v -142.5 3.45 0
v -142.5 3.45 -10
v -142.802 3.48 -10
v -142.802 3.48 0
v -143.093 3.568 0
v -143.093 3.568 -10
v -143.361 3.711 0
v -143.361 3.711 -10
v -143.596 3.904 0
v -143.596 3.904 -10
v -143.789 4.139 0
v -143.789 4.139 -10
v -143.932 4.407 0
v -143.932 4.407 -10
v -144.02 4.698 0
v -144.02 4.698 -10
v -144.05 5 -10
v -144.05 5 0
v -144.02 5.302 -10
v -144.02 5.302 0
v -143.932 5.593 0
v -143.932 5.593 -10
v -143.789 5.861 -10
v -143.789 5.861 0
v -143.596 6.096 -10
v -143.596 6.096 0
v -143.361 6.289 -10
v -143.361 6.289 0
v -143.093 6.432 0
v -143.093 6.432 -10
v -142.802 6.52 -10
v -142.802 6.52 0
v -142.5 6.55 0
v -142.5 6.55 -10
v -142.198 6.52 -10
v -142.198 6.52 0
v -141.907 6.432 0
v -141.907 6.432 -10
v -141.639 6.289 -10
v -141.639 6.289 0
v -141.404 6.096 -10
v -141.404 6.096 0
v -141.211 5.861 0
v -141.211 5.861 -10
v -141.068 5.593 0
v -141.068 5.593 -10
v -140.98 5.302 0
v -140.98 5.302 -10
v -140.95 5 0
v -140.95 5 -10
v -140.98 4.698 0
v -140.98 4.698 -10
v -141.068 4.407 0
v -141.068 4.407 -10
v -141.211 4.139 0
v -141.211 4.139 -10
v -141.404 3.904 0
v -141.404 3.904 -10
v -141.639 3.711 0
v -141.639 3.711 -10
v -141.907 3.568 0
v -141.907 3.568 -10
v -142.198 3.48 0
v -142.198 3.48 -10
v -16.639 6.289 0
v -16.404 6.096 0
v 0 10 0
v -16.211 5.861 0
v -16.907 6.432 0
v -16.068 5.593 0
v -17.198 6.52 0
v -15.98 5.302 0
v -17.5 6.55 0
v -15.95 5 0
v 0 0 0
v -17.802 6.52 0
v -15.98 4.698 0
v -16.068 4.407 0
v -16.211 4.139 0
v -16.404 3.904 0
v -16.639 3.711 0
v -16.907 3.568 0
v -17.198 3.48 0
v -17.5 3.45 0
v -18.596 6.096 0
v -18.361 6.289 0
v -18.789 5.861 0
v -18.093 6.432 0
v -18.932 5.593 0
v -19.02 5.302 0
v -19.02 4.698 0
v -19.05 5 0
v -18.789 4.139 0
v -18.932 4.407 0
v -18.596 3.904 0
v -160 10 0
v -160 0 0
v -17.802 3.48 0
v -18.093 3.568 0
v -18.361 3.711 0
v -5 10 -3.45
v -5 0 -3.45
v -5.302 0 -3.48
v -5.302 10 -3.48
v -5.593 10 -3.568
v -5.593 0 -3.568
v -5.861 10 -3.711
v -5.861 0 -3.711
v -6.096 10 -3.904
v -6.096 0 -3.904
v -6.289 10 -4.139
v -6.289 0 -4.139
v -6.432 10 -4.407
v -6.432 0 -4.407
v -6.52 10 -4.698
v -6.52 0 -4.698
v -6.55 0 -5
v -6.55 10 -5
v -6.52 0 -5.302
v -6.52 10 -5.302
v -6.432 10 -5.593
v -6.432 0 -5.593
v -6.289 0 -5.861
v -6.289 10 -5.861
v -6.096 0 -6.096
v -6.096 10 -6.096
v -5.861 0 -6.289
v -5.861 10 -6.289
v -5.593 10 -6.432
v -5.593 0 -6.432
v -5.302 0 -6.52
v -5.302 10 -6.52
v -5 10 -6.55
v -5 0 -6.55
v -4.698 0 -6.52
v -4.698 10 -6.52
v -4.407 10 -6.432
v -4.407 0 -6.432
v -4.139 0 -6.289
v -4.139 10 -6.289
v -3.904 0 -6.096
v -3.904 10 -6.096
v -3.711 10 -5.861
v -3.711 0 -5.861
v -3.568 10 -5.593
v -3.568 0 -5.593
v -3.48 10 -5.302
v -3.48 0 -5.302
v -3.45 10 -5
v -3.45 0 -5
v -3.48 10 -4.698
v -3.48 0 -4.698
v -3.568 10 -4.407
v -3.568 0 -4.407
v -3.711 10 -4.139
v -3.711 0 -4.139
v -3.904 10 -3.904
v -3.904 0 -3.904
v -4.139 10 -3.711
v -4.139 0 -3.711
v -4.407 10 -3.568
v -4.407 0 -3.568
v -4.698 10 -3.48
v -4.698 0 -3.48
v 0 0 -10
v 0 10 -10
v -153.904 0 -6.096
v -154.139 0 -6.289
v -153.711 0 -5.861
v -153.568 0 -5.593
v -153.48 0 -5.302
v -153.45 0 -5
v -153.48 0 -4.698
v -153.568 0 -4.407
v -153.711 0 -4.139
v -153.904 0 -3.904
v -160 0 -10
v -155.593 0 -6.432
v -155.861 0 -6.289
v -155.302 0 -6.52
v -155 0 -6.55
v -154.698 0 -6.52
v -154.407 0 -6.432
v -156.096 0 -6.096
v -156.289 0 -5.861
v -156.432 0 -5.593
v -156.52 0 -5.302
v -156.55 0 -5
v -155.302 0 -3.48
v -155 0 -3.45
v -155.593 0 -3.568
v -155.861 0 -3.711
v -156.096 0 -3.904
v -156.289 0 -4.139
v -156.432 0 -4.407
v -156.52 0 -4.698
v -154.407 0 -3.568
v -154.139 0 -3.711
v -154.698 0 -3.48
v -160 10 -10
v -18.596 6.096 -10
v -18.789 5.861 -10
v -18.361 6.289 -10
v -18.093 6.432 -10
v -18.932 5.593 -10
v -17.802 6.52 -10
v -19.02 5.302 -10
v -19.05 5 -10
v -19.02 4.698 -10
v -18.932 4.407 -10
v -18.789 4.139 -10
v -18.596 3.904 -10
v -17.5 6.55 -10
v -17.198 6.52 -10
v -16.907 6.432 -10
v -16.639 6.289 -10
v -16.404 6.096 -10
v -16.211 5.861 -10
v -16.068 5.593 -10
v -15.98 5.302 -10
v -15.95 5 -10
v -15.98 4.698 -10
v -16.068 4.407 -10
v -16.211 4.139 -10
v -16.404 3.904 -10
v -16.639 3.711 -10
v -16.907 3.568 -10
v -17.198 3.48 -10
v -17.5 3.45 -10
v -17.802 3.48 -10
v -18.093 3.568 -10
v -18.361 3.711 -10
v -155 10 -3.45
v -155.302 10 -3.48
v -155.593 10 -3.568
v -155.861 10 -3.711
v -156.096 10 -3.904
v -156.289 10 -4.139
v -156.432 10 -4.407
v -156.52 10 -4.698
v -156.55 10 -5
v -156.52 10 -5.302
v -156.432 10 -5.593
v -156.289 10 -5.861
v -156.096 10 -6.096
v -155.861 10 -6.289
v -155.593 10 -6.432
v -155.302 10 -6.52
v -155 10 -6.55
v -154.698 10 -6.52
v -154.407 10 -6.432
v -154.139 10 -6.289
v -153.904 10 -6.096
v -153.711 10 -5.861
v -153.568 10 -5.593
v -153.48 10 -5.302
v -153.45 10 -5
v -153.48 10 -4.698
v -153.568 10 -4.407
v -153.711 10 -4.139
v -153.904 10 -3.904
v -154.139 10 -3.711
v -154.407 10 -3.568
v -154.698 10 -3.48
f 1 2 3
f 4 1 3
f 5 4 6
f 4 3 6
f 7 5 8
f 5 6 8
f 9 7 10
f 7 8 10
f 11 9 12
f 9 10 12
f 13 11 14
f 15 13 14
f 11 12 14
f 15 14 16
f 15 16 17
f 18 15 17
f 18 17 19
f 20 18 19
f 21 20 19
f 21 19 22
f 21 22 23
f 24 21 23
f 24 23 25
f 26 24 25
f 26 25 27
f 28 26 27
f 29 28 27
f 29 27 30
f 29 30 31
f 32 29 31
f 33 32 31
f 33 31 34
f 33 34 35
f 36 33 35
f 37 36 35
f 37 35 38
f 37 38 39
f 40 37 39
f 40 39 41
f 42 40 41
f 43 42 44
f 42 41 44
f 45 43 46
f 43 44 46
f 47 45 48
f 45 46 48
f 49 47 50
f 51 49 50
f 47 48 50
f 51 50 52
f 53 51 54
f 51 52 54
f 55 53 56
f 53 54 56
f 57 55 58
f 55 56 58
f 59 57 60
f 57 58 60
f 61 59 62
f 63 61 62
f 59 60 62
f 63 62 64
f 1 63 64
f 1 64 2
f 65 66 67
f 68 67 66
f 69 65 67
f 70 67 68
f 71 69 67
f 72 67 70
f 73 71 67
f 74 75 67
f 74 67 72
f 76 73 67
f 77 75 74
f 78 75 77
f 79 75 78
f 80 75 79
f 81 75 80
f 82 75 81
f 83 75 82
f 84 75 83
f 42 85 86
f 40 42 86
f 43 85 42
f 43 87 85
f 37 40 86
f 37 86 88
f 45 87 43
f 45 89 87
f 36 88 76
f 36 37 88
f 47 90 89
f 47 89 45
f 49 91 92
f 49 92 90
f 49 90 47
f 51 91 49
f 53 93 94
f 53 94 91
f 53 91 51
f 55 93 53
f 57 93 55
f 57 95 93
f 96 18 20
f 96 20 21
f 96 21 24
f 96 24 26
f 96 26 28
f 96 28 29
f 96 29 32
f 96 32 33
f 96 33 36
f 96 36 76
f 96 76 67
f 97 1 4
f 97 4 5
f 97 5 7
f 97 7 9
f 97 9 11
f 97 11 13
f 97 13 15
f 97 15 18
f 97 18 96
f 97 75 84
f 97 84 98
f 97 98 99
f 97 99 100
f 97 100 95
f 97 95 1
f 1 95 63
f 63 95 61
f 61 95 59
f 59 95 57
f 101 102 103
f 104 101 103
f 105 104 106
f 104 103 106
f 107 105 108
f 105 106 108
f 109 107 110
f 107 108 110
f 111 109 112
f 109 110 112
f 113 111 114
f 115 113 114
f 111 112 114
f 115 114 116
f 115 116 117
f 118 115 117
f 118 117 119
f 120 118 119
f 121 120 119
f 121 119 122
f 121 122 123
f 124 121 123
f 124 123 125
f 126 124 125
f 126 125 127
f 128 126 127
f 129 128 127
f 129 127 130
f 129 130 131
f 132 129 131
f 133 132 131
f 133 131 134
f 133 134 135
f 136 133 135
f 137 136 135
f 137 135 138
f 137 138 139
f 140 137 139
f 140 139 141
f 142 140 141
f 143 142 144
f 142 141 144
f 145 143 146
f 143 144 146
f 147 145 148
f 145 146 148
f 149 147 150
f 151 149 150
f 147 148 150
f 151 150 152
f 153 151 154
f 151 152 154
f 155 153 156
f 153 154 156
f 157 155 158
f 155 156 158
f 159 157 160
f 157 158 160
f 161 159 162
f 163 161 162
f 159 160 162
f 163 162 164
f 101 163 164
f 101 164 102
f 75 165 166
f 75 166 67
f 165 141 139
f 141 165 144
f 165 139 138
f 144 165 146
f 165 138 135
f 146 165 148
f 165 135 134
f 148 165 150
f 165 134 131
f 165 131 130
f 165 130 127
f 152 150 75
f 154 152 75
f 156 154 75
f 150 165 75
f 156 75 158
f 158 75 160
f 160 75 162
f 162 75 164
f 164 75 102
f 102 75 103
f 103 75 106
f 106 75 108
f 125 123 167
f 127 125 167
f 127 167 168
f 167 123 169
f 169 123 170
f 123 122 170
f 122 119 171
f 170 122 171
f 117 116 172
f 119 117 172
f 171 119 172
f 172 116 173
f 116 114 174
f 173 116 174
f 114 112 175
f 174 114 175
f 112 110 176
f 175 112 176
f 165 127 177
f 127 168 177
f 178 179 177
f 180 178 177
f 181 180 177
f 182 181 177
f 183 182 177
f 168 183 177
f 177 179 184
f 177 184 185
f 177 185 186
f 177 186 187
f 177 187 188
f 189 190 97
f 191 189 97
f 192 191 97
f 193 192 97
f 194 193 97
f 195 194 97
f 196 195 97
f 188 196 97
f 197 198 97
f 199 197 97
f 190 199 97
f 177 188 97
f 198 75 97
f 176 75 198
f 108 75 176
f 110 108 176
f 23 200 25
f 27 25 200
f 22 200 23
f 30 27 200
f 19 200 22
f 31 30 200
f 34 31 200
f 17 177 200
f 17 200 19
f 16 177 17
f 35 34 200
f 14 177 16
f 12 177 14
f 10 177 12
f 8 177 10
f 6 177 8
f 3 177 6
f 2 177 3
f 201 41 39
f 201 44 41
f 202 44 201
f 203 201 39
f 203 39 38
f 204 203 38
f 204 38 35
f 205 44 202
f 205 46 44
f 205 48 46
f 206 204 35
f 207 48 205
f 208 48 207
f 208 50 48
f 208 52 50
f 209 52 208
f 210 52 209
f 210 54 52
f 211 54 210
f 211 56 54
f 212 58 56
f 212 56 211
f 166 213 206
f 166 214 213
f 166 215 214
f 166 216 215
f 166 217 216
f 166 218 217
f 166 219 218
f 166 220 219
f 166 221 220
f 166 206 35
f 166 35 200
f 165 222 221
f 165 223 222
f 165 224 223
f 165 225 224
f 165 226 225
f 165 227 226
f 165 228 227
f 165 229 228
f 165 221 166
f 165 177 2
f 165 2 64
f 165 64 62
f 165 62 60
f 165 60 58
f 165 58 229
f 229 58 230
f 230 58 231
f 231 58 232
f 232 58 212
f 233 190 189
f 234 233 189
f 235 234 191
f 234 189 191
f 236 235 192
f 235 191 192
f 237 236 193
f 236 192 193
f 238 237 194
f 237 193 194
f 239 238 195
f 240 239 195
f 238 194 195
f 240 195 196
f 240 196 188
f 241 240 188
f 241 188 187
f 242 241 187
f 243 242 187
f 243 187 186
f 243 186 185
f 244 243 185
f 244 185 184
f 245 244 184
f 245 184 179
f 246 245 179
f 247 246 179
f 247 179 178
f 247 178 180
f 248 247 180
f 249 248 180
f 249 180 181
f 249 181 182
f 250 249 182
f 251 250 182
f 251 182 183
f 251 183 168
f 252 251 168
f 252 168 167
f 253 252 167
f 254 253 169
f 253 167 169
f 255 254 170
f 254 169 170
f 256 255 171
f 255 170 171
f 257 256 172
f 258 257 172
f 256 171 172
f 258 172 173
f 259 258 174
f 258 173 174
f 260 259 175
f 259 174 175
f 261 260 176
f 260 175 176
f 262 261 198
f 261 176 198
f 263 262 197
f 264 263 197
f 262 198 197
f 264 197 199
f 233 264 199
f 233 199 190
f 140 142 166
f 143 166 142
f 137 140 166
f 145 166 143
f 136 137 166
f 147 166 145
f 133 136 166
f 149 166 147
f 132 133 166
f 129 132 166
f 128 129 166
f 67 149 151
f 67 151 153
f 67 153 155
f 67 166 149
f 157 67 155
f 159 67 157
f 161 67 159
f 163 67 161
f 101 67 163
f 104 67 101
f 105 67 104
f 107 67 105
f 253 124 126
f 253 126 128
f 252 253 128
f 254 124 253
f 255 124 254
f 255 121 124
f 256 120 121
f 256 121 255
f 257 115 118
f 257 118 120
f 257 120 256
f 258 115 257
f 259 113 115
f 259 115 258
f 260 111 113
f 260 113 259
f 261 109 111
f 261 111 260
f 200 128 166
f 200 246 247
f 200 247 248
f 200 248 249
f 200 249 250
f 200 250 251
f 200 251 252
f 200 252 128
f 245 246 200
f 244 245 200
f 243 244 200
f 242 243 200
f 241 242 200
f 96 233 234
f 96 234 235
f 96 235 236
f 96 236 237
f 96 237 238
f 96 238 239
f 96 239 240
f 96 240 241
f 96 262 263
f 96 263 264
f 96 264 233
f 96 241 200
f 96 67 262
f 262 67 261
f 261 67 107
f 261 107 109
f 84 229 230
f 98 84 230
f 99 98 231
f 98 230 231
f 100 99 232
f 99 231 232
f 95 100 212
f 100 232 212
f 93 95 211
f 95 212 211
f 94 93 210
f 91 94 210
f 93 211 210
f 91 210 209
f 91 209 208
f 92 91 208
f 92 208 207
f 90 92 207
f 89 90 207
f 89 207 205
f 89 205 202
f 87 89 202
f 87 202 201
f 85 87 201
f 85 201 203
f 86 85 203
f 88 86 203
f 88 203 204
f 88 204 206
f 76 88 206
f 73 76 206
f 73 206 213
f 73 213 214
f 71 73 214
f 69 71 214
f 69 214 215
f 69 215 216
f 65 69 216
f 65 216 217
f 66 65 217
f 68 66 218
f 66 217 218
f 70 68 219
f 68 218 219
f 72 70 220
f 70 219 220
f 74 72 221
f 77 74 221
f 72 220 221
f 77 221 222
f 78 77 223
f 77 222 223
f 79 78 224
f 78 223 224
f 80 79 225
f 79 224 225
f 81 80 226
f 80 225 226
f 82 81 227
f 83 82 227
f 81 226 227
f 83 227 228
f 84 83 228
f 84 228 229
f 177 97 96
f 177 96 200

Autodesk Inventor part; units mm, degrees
ref_plane "YZ Plane" through (0, 0, 0) normal (1, 0, 0) x (0, 1, 0)
ref_plane "XZ Plane" through (0, 0, 0) normal (0, 1, 0) x (-1, 0, 0)
ref_plane "XY Plane" through (0, 0, 0) normal (0, 0, 1) x (1, 0, 0)
sketch "スケッチ1" plane through (0, 0, 0) normal (0, 1, 0) x (-1, 0, 0)
  line L0 (0, 0) -> (160, 0)
  line L1 (160, 0) -> (160, -10)
  line L2 (160, -10) -> (0, -10)
  line L3 (0, -10) -> (0, 0)
  dimension "d0" = 160
  dimension "d1" = 10
extrude "押し出し1" add sketch "スケッチ1" along normal blind 10
sketch "スケッチ2" plane through (0, 10, 0) normal (0, 1, 0) x (1, 0, 0)
  line L0 (-160, 10) -> (-160, 0) projected
  line L1 (0, 0) -> (0, 10) projected
  point P0 (-5, 5)
  point P1 (-155, 5)
  point P2 (-160, 5)
  point P3 (0, 5)
  point P4 (0, 5)
  point P5 (-160, 5)
  dimension "d4" = 5
  dimension "d5" = 5
hole "穴1" at (-5, 10, -5) at (-155, 10, -5) direction (0, -1, 0) diameter 3.1 end through all
sketch "スケッチ3" plane through (-160, 0, 0) normal (0, 0, 1) x (1, 0, 0)
  line L0 (160, 0) -> (160, 10) projected
  line L1 (0, 0) -> (0, 10) projected
  point P0 (17.5, 5)
  point P1 (142.5, 5)
  point P2 (160, 5)
  point P3 (0, 5)
  point P4 (160, 5)
  point P5 (0, 5)
  dimension "d13" = 17.5
  dimension "d14" = 17.5
hole "穴2" at (-142.5, 5, 0) at (-17.5, 5, 0) direction (0, 0, -1) diameter 3.1 end through all
properties part number "Shita"
